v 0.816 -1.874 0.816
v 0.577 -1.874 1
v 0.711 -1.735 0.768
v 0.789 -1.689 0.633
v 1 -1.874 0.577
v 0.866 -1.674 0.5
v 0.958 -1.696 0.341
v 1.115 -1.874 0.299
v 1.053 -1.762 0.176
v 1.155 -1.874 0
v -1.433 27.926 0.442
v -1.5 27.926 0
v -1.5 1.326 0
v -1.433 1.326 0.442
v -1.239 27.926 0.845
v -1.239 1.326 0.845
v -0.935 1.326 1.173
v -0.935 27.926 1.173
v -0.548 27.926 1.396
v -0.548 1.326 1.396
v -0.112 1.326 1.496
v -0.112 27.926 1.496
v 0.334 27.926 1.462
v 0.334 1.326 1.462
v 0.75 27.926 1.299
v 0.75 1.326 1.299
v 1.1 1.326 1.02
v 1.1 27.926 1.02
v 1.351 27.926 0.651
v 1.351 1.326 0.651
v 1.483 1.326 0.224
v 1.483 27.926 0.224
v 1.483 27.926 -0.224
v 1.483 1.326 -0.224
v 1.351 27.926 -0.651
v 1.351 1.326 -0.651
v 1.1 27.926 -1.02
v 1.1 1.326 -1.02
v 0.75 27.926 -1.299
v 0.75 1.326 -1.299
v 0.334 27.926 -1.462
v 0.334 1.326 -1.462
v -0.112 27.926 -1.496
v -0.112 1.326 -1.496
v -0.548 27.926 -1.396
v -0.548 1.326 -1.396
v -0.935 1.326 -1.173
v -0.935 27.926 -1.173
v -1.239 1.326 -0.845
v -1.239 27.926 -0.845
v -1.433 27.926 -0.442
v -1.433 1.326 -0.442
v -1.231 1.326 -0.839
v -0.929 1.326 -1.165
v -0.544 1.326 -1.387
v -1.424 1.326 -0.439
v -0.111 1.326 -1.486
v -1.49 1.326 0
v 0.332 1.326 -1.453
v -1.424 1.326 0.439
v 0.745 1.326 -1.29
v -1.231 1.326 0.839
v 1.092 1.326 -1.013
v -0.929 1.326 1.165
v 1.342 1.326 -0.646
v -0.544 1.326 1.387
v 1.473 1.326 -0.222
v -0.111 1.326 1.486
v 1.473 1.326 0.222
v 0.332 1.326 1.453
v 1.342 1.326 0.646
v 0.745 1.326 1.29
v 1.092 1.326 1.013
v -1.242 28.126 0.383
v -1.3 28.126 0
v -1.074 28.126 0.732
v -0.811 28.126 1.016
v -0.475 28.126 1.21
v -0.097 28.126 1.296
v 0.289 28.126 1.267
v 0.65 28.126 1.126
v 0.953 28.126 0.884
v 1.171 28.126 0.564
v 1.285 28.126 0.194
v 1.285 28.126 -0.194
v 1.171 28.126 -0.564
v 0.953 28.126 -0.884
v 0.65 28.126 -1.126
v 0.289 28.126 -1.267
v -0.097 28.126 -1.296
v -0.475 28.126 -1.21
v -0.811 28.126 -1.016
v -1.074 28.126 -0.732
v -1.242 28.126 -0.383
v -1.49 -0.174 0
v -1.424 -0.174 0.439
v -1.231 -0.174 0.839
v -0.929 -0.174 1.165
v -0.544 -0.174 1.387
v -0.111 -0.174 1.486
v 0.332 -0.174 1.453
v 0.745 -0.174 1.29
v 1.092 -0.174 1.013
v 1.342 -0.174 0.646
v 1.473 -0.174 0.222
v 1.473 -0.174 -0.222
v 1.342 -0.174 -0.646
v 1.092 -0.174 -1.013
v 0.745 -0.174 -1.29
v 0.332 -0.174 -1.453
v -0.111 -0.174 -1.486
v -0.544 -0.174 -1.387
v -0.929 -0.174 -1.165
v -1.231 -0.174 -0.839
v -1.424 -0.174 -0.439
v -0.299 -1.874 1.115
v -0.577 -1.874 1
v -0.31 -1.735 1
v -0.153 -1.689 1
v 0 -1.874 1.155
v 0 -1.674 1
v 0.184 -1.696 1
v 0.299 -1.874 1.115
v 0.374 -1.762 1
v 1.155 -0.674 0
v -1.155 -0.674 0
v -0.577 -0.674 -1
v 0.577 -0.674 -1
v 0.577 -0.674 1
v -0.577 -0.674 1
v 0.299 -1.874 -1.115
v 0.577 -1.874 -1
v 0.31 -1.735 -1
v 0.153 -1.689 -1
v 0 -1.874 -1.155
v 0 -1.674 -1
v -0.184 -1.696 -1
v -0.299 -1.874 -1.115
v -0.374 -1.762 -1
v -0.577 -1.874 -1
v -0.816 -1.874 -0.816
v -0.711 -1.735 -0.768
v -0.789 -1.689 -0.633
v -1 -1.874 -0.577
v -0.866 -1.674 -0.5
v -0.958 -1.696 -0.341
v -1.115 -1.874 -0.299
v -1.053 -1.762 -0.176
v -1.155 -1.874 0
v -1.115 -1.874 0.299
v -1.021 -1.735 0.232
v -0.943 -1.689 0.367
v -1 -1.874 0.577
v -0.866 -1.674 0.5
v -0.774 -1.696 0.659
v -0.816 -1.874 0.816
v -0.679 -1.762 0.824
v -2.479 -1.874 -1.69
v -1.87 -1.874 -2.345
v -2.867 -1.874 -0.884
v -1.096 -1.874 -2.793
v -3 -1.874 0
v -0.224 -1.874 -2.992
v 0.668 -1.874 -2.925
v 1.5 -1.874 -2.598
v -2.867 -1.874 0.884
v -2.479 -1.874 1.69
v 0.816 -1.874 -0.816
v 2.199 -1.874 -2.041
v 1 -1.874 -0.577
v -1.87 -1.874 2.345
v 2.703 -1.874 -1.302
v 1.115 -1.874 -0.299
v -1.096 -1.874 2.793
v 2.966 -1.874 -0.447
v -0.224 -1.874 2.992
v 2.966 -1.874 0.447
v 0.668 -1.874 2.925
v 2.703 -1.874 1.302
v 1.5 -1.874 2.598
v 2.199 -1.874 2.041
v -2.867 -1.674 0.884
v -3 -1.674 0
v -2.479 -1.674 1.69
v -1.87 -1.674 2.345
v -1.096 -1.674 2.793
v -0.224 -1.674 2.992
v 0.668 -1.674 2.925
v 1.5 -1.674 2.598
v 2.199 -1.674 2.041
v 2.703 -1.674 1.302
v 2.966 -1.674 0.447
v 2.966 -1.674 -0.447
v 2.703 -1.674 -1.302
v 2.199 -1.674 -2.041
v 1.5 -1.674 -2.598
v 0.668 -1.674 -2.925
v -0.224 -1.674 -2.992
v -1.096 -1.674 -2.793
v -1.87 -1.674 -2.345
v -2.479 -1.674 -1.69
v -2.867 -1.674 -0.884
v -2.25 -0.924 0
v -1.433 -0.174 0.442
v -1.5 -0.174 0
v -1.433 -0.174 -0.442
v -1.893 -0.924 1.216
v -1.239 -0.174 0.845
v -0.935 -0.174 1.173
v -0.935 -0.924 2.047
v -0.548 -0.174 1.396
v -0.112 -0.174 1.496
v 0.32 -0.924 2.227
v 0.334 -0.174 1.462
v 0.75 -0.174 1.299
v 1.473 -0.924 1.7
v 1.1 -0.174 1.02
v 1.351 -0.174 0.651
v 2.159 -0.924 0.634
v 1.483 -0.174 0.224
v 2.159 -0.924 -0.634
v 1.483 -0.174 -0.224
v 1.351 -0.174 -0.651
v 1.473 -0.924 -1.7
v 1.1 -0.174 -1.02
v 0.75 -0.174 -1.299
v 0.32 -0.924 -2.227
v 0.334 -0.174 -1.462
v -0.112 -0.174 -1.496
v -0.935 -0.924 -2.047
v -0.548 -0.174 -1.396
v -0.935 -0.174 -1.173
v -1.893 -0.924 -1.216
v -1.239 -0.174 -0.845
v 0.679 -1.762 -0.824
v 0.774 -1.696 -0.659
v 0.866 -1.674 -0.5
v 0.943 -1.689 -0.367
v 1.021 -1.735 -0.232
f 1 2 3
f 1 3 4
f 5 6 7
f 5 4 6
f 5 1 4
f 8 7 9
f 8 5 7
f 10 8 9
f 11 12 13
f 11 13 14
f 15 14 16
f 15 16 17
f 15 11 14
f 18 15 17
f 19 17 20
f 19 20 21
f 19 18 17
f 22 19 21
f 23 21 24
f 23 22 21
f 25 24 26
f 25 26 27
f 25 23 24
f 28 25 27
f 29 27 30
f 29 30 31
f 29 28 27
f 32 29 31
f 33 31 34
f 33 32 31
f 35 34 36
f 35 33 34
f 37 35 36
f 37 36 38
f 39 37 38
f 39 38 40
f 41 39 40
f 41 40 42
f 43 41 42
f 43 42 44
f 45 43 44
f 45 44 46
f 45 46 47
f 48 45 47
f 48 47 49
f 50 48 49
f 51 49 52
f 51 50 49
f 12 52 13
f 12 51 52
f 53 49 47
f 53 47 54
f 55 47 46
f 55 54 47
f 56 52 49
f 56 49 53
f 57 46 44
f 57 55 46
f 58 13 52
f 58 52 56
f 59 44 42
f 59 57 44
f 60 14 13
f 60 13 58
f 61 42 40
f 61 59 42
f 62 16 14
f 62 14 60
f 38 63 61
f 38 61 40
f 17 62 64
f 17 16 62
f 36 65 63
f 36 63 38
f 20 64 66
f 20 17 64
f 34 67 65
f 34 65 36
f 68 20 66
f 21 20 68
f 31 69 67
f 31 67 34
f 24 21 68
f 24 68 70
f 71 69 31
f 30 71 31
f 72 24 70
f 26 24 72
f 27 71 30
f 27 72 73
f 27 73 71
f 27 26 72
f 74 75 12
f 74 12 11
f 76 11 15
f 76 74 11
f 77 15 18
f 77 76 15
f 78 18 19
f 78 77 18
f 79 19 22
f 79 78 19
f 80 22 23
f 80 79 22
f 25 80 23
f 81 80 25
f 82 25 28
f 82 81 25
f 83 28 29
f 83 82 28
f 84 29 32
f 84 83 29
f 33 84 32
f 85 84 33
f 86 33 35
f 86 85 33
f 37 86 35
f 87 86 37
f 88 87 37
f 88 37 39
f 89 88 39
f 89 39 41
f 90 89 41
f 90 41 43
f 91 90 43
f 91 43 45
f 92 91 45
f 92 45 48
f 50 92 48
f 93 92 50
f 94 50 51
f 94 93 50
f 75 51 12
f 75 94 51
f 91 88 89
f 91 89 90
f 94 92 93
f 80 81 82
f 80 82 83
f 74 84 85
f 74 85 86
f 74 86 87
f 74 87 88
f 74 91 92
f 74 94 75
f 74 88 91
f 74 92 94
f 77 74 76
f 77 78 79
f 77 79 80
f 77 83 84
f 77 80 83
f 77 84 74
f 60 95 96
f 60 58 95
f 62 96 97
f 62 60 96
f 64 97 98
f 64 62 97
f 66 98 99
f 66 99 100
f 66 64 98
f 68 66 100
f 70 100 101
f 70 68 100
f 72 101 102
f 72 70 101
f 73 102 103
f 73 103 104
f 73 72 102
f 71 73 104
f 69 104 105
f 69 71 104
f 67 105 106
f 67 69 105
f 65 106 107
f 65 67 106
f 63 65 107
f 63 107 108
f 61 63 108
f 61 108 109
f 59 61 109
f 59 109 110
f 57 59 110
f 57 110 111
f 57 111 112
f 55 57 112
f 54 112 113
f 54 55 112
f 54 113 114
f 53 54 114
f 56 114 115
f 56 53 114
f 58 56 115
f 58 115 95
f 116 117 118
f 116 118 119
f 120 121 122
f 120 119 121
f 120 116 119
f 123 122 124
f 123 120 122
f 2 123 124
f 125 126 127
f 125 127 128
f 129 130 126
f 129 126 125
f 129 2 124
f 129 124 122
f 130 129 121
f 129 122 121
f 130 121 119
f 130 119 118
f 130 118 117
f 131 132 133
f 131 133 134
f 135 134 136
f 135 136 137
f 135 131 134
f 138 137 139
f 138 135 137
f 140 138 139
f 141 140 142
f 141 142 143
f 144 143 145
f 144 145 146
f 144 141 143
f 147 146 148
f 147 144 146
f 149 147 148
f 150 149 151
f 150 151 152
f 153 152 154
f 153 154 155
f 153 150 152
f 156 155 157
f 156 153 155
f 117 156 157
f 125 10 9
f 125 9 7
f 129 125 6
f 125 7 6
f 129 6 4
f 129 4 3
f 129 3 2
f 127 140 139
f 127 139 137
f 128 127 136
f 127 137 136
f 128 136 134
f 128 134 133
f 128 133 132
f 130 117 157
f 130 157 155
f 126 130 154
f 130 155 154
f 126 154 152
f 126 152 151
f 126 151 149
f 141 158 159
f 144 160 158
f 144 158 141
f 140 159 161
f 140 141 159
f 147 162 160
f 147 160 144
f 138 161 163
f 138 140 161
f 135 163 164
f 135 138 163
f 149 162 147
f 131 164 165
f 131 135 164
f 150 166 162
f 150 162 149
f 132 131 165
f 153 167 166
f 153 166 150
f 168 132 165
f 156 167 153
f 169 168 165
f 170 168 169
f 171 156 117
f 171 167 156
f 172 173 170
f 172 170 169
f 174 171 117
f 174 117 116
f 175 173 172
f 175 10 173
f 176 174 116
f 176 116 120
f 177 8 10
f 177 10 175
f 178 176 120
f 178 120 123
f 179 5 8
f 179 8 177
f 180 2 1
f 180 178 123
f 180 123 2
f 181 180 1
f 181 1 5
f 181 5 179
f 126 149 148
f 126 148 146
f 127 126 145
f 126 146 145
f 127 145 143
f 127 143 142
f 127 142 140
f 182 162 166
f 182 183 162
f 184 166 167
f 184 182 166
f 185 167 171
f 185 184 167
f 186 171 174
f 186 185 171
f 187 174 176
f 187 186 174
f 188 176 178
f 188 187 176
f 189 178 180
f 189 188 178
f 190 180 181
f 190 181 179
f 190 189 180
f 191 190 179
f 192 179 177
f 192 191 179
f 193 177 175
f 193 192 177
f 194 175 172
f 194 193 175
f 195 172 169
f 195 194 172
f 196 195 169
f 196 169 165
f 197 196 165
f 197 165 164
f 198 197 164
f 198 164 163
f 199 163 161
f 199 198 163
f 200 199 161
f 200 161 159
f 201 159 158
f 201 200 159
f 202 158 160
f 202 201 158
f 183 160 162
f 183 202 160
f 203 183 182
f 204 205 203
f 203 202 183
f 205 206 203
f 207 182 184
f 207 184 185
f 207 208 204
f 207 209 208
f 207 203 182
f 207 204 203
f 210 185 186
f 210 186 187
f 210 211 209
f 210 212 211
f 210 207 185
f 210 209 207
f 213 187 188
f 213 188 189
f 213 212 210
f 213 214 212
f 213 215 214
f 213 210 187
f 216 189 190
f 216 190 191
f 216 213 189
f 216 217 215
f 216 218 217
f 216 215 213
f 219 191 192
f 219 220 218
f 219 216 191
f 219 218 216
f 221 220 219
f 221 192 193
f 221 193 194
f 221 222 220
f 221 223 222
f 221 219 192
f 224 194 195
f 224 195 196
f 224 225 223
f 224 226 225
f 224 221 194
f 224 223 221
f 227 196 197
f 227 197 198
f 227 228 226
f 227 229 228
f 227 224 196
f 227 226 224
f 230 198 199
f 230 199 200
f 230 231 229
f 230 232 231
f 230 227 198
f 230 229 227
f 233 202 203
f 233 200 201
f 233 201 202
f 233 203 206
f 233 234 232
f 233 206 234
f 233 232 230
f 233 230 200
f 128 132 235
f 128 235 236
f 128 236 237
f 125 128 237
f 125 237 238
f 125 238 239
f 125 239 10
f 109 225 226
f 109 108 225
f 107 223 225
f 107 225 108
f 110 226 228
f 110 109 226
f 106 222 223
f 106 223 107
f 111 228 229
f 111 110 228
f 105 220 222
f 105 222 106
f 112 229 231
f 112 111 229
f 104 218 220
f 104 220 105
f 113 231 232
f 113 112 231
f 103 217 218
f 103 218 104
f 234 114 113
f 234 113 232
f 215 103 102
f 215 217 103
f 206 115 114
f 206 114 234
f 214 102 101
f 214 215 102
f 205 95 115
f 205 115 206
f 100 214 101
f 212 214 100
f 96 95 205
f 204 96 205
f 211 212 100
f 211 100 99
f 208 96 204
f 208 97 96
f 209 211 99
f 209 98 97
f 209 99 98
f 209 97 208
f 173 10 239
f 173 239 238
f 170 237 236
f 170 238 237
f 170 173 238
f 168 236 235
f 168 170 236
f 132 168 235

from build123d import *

# Parameters (mm, degrees)
CHAMFER1_SIZE   = 0.2
HEX_DEPTH_DEPTH = 1.2
SKETCH4_R       = 1
SKETCH3_R       = 1.154700538


with BuildPart() as part:
    # Sketch1 → Revolve1 (revolve)
    with BuildSketch(Plane.XY):
        Polygon((0, -1.873883868), (-3, -1.873883868), (-3, -1.673883868), (-1.5, -0.173883868), (-1.49, -0.173883868), (-1.49, 1.326116132), (-1.5, 1.326116132), (-1.5, 28.126116132), (0, 28.126116132), align=None)
    revolve(axis=Axis((0, 0, 0), (0, 1, 0)))

    # Chamfer1
    chamfer1_edges = [part.edges().sort_by_distance(p)[0] for p in [
        (1.5, 28.126116132, 0),
    ]]
    chamfer(chamfer1_edges, length=CHAMFER1_SIZE)

    # Sketch2 → hex depth (cut)
    with BuildSketch(Plane.XZ.offset(1.873883868)):
        Polygon((1.154700538, 0), (0.577350269, 1), (-0.577350269, 1), (-1.154700538, 0), (-0.577350269, -1), (0.577350269, -1), align=None)
    extrude(amount=-HEX_DEPTH_DEPTH, mode=Mode.SUBTRACT)

    # Sketch4 → hex corner cut section 0
    with BuildSketch(Plane(origin=(0, -1.673883868, 0), x_dir=(1, 0, 0), z_dir=(0, 1, 0))):
        Circle(SKETCH4_R)
    # Sketch3 → hex corner cut section 1
    with BuildSketch(Plane.XZ.offset(1.873883868)):
        Circle(SKETCH3_R)
    loft(mode=Mode.SUBTRACT)


solid = part.part
